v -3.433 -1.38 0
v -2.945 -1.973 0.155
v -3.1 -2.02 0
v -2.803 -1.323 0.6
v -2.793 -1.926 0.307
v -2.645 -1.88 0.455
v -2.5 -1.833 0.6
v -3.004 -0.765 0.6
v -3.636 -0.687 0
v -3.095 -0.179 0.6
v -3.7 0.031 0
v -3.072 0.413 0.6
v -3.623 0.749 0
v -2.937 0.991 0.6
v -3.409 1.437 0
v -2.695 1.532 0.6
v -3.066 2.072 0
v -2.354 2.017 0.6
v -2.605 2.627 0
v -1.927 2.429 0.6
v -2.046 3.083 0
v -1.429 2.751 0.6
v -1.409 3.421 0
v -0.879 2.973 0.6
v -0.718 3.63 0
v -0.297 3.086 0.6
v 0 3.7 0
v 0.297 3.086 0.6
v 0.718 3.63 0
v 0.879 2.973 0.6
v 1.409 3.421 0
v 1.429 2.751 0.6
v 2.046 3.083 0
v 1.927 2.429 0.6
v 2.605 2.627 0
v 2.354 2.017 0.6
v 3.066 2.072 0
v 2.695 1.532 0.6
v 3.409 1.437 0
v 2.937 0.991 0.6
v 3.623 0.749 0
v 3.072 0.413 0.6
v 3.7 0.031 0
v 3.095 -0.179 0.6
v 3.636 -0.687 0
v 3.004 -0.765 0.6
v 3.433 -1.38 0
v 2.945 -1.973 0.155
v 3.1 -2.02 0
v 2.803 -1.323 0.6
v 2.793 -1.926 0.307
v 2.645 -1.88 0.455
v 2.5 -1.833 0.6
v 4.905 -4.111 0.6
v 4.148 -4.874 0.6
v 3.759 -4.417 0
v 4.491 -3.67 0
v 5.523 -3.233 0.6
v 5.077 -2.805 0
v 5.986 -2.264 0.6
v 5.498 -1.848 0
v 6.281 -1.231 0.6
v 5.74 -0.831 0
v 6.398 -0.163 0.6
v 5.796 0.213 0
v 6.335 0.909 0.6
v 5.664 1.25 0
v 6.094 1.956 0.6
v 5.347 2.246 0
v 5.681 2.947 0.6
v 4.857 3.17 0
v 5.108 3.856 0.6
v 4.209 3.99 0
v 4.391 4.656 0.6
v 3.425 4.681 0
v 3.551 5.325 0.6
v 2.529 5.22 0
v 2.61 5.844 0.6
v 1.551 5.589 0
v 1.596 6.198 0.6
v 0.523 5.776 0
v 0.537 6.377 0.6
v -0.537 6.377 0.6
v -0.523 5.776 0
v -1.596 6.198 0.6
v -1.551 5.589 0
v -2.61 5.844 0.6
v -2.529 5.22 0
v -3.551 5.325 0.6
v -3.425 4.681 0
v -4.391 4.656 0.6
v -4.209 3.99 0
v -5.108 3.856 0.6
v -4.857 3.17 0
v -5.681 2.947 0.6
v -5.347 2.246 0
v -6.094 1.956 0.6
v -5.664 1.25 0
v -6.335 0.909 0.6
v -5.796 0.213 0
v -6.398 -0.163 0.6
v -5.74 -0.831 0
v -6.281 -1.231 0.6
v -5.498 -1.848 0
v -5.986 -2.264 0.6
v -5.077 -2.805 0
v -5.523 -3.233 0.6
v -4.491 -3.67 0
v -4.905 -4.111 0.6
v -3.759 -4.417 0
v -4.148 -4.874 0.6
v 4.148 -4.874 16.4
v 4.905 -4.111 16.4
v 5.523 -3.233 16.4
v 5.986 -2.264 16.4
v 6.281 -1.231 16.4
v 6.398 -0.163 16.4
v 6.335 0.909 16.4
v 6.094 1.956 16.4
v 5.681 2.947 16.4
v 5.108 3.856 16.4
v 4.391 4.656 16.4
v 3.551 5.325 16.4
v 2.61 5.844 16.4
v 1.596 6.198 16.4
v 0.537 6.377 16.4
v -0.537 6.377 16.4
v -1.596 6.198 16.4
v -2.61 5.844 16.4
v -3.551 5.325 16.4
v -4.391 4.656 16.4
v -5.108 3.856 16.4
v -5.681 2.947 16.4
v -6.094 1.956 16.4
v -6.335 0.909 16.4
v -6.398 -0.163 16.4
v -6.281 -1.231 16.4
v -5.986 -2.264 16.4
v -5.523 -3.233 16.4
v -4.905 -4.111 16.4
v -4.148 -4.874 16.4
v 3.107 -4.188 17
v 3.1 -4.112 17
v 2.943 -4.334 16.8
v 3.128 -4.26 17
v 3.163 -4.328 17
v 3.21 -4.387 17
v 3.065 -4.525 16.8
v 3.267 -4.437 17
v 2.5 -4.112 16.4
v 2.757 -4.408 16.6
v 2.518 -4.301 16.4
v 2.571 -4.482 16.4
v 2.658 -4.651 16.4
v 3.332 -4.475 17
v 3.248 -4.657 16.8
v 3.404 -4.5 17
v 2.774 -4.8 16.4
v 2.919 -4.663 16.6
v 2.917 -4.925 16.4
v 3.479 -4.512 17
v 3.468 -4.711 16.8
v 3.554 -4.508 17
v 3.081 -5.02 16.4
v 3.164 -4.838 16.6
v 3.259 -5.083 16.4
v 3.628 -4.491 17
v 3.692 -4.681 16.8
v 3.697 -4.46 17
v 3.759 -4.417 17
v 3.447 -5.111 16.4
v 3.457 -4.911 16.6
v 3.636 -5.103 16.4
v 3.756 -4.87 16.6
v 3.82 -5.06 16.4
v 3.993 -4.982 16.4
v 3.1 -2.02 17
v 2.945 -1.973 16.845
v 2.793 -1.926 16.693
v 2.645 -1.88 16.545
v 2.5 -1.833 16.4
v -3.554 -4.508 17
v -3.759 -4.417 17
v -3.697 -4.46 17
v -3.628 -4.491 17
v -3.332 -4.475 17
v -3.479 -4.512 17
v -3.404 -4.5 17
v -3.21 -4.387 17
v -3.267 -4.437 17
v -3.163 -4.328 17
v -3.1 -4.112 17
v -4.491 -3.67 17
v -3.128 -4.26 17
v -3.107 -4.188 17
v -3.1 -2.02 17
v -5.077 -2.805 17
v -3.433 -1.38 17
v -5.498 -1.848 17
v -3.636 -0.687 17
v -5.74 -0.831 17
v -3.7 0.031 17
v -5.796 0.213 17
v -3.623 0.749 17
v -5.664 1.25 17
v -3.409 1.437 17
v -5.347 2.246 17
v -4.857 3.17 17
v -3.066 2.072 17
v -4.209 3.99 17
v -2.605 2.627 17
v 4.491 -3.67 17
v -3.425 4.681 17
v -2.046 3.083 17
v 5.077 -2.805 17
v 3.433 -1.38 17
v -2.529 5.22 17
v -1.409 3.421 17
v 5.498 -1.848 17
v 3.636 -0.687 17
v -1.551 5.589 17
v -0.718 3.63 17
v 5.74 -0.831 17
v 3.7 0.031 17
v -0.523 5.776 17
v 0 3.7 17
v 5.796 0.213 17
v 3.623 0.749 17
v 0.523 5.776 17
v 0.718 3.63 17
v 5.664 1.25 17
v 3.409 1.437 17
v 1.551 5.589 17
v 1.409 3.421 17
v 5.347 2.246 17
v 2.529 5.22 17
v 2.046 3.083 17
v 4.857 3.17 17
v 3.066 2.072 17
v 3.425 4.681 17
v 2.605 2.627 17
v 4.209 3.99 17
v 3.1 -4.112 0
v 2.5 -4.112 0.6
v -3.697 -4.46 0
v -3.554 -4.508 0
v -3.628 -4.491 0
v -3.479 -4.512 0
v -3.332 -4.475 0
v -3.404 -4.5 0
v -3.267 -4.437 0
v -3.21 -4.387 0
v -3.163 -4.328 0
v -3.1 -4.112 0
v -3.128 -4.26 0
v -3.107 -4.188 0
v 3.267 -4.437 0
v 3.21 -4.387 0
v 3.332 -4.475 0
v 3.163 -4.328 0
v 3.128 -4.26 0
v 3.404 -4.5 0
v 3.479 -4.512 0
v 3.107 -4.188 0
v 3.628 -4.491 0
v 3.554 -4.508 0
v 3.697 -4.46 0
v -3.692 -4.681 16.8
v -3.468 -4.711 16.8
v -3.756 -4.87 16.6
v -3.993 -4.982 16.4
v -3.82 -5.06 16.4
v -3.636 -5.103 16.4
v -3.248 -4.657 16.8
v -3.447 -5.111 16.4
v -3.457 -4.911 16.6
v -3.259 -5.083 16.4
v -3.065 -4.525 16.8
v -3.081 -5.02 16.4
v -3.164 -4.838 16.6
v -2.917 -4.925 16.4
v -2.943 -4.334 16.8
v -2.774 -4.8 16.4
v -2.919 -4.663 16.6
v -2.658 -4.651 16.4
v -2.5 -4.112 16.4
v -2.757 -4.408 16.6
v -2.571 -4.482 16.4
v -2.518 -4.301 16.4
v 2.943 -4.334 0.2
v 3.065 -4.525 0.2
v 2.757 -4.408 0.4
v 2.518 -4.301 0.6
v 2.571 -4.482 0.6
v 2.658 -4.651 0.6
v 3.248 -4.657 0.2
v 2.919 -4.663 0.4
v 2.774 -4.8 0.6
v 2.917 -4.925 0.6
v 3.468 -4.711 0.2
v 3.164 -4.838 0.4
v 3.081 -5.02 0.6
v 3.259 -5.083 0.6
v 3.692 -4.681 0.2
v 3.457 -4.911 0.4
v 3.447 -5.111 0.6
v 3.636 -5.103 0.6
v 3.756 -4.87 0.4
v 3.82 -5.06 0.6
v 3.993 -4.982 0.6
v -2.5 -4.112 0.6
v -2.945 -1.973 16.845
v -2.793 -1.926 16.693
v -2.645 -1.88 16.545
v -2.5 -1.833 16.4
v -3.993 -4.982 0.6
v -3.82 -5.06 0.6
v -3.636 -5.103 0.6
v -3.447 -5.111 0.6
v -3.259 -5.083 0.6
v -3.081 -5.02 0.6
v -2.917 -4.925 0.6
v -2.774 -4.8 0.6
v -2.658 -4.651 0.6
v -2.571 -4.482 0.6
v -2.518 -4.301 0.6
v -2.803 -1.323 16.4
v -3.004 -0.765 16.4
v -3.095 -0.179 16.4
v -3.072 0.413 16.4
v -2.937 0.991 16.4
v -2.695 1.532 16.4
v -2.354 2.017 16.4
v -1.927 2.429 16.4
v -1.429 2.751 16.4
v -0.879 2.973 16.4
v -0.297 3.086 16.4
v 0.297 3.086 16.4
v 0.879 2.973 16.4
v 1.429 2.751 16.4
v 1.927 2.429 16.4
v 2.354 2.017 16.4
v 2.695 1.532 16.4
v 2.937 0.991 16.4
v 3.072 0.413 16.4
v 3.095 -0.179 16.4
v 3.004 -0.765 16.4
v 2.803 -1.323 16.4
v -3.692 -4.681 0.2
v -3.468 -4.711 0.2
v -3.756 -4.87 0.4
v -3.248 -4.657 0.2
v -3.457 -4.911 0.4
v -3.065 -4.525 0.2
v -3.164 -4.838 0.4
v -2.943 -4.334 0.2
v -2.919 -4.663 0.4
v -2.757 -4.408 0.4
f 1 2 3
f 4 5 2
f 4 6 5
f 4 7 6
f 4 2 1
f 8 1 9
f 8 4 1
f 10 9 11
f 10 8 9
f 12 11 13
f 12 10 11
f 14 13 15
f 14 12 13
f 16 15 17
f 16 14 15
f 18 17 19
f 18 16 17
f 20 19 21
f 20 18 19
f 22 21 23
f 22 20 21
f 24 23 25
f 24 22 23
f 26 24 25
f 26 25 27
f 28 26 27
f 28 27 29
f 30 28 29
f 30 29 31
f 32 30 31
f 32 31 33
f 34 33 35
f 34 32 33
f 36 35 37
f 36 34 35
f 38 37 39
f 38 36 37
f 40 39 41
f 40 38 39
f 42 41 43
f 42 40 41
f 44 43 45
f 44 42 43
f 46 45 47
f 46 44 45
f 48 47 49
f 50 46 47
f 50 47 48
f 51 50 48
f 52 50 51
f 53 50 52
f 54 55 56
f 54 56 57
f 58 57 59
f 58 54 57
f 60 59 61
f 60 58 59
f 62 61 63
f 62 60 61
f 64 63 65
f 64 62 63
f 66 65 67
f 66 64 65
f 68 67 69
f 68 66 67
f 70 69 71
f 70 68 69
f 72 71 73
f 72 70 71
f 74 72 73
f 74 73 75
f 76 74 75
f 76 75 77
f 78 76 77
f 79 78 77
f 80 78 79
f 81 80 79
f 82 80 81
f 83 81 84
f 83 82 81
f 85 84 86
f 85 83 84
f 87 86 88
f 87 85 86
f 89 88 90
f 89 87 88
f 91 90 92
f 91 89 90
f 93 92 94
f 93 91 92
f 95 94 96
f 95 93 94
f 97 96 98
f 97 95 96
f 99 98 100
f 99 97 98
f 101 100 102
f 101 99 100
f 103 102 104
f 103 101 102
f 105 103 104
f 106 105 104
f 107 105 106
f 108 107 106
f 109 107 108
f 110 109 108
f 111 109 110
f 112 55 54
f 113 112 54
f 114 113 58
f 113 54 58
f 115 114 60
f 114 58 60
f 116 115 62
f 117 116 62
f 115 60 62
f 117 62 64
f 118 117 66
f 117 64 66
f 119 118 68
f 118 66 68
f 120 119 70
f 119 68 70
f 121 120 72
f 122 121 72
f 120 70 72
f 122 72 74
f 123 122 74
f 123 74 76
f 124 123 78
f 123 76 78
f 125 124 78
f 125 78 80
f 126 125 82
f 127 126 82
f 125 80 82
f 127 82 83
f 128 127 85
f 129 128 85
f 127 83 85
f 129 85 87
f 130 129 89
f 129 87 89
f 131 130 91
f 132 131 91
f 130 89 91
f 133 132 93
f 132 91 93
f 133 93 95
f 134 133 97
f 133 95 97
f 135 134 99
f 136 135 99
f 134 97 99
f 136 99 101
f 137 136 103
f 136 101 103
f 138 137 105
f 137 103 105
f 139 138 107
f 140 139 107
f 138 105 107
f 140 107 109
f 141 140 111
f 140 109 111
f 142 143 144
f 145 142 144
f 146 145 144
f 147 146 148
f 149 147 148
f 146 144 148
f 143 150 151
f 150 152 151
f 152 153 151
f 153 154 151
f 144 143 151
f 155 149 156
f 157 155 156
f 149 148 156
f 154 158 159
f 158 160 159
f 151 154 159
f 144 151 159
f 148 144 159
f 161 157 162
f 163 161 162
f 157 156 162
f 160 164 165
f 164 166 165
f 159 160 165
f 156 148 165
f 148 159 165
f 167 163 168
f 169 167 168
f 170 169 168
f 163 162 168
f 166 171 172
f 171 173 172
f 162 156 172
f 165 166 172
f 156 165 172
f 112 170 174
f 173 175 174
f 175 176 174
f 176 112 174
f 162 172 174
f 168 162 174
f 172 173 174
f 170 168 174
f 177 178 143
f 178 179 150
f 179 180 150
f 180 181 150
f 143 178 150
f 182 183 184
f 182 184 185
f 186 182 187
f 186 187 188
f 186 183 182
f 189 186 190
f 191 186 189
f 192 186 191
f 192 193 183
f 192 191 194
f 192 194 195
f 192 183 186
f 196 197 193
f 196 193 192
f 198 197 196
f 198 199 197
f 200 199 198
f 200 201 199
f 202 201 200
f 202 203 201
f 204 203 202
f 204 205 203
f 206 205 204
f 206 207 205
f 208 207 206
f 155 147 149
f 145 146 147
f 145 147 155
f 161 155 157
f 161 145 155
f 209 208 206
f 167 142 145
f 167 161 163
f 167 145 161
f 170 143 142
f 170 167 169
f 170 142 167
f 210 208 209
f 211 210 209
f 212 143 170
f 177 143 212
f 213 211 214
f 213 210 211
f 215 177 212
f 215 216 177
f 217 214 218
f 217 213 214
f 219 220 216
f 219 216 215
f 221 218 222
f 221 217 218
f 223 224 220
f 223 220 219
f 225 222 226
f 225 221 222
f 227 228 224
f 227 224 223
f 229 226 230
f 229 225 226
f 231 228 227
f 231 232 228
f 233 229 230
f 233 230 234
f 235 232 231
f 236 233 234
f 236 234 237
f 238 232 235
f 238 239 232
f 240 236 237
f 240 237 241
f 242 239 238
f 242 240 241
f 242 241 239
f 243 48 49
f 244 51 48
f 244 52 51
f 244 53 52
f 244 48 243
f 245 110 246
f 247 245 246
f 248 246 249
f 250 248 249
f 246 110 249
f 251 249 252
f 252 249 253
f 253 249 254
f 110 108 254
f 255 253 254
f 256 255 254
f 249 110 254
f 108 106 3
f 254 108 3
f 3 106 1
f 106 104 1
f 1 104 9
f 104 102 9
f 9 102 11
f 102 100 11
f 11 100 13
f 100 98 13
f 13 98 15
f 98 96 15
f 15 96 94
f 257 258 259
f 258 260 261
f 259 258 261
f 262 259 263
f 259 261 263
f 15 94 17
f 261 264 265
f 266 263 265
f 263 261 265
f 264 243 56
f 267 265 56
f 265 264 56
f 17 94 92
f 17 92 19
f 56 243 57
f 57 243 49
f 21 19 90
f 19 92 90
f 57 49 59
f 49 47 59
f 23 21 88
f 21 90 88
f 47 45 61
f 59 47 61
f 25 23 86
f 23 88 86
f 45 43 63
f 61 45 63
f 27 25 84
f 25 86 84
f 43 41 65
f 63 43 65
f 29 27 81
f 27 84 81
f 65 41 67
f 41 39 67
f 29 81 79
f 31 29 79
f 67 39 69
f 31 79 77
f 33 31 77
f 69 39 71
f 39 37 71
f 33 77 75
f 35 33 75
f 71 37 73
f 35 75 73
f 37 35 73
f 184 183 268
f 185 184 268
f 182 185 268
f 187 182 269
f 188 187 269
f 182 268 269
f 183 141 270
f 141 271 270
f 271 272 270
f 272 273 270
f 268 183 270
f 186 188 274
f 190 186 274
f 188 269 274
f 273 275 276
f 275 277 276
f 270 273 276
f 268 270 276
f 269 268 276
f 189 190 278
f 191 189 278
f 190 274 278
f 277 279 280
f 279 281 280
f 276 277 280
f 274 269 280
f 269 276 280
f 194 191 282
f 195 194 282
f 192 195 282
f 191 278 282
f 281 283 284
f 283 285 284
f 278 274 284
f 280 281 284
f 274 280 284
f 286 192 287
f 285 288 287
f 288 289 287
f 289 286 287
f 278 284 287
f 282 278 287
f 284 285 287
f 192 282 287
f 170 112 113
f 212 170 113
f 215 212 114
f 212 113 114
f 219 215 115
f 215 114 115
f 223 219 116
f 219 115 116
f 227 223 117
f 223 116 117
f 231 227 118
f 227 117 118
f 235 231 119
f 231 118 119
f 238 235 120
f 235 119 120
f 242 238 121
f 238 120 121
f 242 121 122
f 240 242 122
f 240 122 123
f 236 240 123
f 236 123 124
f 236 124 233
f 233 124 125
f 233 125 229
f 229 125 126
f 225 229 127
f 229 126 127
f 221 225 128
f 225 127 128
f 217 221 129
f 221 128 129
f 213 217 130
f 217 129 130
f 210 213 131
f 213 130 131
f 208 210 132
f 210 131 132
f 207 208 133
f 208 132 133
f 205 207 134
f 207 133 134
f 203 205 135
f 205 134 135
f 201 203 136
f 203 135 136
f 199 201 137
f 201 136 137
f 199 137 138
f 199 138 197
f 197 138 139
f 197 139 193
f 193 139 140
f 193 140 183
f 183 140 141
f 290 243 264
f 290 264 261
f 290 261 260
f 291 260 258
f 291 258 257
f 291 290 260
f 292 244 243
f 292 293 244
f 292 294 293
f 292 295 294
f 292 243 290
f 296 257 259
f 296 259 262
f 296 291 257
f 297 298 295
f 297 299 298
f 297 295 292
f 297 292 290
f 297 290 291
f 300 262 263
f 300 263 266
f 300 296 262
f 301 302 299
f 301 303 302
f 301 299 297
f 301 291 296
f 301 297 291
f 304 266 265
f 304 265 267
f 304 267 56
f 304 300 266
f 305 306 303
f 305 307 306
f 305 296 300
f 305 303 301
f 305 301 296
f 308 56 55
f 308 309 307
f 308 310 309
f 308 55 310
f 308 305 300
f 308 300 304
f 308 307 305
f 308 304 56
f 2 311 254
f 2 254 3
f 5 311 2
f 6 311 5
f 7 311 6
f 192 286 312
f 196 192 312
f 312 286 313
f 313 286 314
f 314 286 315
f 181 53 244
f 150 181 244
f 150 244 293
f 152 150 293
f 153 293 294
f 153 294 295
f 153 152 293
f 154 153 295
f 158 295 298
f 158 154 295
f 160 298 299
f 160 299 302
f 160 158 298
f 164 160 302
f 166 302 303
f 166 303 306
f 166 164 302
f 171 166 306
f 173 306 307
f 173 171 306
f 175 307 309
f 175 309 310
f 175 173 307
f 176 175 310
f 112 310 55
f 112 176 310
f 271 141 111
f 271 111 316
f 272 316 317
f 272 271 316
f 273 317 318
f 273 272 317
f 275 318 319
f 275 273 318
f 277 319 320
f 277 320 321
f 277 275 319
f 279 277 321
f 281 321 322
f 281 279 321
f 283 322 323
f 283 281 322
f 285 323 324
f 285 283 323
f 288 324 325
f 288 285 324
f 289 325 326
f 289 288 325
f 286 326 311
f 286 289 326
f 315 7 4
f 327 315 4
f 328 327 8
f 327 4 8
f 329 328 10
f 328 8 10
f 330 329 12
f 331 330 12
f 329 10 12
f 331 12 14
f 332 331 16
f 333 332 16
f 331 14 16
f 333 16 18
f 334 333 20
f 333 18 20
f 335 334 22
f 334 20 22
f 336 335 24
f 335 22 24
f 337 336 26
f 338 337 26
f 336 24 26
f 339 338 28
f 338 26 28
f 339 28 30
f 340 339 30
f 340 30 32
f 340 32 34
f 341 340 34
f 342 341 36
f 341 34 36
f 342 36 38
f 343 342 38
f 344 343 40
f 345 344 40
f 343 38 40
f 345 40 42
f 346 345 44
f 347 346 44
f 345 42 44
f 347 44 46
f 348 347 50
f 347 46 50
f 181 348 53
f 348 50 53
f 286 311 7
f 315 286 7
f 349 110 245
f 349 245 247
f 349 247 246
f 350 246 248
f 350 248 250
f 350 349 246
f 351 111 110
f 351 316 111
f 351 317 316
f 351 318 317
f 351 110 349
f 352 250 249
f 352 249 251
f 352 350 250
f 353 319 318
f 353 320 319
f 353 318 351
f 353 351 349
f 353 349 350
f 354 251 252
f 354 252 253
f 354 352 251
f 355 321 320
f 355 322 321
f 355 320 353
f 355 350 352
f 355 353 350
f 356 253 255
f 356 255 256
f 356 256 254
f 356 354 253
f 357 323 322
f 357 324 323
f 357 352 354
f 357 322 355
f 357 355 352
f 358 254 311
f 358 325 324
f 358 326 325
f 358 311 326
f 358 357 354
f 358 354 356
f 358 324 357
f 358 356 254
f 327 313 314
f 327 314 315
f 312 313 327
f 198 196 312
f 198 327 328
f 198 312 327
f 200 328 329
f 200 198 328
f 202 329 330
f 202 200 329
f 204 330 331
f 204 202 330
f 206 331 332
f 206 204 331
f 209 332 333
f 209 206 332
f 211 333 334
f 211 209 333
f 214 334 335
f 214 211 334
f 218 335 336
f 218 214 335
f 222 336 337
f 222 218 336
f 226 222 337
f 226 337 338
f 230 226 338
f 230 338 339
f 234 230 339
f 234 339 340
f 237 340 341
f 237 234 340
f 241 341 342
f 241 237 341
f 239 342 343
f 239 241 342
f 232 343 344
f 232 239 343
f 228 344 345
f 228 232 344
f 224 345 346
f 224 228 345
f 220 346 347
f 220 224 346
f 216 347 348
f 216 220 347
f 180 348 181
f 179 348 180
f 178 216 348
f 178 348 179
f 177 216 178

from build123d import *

# Parameters (mm, degrees)
F1_DEPTH = 17
F2_R     = 1
F3_SIZE  = 0.6


with BuildPart() as f1:
    # F0 (on Top) → F1 (new body)
    with BuildSketch(Plane.XY):
        with BuildLine():
            ThreePointArc((-2.5, -1.83303), (0, 3.1), (2.5, -1.83303))
            Line((2.5, -1.83303), (2.5, -5.891519))
            ThreePointArc((2.5, -5.891519), (0, 6.4), (-2.5, -5.891519))
            Line((-2.5, -5.891519), (-2.5, -1.83303))
        make_face()
    extrude(amount=F1_DEPTH)

    # F2
    f2_edges = [f1.edges().sort_by_distance(p)[0] for p in [
        (-2.5, -5.891519, 8.5),
        (2.5, -5.891519, 8.5),
    ]]
    fillet(f2_edges, radius=F2_R)

    # F3
    f3_edges = [f1.edges().sort_by_distance(p)[0] for p in [
        (-2.5, -2.972604, 17),
        (-3.080565, -5.019962, 17),
        (0, 3.1, 17),
        (0, 6.4, 17),
        (2.5, -2.972604, 17),
        (3.080565, -5.019962, 17),
        (-2.5, -2.972604, 0),
        (-3.080565, -5.019962, 0),
        (0, 3.1, 0),
        (0, 6.4, 0),
        (2.5, -2.972604, 0),
        (3.080565, -5.019962, 0),
    ]]
    chamfer(f3_edges, length=F3_SIZE)


solid = f1.part
